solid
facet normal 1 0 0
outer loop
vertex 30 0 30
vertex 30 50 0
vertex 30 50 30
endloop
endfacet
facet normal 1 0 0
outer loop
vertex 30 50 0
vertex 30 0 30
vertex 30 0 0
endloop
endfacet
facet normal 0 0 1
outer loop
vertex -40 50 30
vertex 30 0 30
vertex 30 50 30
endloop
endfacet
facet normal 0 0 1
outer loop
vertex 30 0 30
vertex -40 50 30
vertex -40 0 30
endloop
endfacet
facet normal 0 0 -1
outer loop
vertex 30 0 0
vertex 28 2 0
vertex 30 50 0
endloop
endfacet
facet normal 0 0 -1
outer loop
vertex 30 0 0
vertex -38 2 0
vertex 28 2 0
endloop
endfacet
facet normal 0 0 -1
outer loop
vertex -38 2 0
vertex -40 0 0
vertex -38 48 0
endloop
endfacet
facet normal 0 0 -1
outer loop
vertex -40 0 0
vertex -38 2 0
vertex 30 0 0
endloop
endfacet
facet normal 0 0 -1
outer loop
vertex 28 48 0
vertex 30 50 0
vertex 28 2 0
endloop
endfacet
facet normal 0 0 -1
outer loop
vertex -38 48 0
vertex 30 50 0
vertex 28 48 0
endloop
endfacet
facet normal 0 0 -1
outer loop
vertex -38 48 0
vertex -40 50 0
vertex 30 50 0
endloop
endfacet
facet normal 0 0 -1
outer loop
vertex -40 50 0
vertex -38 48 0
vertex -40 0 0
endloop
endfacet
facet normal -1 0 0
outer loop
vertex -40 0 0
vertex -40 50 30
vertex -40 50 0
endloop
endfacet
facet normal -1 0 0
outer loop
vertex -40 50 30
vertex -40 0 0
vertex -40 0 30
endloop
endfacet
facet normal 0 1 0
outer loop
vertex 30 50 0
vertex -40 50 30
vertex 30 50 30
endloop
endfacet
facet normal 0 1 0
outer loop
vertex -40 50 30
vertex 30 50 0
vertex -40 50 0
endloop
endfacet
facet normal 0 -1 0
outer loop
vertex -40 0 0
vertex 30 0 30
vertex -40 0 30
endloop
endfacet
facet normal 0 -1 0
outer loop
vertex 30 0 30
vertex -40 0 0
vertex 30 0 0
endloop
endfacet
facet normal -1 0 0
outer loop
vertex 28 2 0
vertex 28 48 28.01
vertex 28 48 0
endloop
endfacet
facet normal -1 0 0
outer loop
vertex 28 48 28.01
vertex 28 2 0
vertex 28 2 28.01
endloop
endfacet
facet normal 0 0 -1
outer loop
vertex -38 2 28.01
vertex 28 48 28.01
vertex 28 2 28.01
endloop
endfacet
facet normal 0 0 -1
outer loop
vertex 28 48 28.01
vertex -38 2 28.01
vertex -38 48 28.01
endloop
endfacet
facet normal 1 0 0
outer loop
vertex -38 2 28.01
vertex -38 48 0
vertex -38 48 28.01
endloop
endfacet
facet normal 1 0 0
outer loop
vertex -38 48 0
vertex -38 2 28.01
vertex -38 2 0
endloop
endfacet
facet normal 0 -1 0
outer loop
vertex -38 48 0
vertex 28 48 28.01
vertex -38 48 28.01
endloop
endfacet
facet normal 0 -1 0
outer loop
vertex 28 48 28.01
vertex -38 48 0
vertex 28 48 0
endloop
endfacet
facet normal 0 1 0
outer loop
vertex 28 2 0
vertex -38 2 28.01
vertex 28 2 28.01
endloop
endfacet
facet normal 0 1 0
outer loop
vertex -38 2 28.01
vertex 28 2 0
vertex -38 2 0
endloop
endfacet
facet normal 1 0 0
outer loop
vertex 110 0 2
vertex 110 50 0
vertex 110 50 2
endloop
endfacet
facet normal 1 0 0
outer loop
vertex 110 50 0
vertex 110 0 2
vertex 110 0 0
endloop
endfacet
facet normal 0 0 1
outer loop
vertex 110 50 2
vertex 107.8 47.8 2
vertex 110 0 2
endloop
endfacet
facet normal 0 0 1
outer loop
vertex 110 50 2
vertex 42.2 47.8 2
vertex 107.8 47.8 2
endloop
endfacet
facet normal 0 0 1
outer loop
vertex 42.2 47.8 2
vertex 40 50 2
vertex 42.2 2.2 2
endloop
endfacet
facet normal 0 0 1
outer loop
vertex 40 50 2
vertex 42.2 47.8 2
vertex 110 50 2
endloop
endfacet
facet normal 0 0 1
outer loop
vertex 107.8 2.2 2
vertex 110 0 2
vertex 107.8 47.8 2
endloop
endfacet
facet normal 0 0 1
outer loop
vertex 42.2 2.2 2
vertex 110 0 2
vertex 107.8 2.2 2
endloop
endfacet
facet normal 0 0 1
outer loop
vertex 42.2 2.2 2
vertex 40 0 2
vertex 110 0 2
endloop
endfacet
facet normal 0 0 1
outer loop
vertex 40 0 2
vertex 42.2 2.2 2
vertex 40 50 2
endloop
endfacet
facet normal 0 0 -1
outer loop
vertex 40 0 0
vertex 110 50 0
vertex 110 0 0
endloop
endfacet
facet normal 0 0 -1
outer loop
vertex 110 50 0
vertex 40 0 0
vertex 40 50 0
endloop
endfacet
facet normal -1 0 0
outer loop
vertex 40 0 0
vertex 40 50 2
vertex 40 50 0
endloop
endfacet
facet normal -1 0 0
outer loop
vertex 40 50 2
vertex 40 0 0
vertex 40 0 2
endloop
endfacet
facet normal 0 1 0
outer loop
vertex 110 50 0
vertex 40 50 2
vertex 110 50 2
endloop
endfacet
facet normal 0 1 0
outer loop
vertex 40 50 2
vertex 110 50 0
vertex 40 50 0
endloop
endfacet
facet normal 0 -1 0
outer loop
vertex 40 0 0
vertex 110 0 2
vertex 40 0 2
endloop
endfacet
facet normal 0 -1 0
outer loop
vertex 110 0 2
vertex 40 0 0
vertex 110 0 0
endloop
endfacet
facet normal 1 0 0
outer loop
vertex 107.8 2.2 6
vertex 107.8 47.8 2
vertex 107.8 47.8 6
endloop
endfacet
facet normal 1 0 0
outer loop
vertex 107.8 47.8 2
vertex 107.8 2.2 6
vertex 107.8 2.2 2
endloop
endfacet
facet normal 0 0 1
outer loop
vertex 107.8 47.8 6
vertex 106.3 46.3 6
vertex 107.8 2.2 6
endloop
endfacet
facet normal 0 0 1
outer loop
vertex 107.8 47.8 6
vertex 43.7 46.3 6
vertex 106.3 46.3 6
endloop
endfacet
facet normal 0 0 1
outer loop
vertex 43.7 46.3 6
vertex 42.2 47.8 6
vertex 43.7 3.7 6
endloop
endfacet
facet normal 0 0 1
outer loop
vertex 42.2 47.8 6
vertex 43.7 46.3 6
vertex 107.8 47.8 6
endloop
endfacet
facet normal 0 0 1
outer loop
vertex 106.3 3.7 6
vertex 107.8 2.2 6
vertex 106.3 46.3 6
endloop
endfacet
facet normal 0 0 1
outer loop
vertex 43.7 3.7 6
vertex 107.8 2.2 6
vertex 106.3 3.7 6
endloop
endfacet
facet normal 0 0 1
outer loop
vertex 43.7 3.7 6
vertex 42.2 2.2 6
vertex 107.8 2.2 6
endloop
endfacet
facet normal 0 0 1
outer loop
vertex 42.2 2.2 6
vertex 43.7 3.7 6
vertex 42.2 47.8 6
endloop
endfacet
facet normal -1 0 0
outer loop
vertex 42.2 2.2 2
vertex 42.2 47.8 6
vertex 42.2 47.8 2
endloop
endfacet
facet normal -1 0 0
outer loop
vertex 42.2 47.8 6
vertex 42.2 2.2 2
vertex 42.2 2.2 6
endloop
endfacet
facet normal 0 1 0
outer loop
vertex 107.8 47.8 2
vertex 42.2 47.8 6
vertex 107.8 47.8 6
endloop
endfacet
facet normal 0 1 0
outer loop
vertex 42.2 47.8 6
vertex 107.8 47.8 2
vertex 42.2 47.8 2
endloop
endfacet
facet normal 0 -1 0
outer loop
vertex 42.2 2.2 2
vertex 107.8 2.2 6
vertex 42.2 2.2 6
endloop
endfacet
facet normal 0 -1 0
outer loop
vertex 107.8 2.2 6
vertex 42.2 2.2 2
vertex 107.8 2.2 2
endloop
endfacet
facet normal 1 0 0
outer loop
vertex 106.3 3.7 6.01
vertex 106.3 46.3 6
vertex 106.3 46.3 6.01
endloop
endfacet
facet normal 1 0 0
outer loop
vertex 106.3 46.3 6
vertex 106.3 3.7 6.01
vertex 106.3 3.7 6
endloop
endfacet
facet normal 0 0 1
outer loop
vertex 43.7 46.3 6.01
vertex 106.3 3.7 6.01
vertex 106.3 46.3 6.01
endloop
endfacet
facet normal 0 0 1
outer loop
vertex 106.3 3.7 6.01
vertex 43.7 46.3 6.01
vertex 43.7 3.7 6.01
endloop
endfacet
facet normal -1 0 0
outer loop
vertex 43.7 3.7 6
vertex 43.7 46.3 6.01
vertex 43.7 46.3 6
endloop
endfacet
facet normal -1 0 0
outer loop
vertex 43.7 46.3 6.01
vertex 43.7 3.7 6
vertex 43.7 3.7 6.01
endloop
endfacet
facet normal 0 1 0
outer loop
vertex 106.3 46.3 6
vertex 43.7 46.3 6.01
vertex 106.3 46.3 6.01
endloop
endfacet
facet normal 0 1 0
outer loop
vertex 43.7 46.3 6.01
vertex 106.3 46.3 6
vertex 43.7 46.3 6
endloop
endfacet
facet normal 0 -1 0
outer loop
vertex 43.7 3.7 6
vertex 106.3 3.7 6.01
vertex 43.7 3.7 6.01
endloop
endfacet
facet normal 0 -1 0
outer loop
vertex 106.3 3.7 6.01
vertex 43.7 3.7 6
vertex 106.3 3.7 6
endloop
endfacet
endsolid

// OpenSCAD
// Dimensions for the box and lid
box_outer_x = 70;
box_outer_y = 50;
box_outer_z = 30;
wall_thickness = 2;
floor_thickness = 2;

lid_plate_x = 70;
lid_plate_y = 50;
lid_plate_z = 2;
lip_thickness = 1.5;
lip_height = 4;
lip_outer_x = 65.6;
lip_outer_y = 45.6;

// Clearance and gap settings
gap_between_parts = 10;
$fn = 64;

// Calculate derived dimensions
box_inner_x = box_outer_x - 2 * wall_thickness;
box_inner_y = box_outer_y - 2 * wall_thickness;
box_inner_z = box_outer_z - floor_thickness;

// Position offsets to center parts and maintain gap
// Box is on the left (-X), Lid is on the right (+X)
// Box center X: - (box_outer_x/2 + gap/2)
// Lid center X: + (lid_plate_x/2 + gap/2)
box_offset_x = -(box_outer_x / 2 + gap_between_parts / 2);
lid_offset_x = (lid_plate_x / 2 + gap_between_parts / 2);

// Part 1: The Box
translate([box_offset_x, 0, 0])
difference()
{
    // Outer shell of the box
    cube([box_outer_x, box_outer_y, box_outer_z], center = false);
    
    // Inner cavity (open top)
    // Extend slightly past the top to ensure clean cut
    translate([wall_thickness, wall_thickness, -0.01])
    cube([box_inner_x, box_inner_y, box_inner_z + 0.02], center = false);
}

// Part 2: The Lid (printed upside down, so plate is on bed)
translate([lid_offset_x, 0, 0])
union()
{
    // Main plate lying on the bed
    cube([lid_plate_x, lid_plate_y, lid_plate_z], center = false);
    
    // Lip structure
    // The lip is centered on the plate
    lip_offset_x = (lid_plate_x - lip_outer_x) / 2;
    lip_offset_y = (lid_plate_y - lip_outer_y) / 2;
    
    // Outer wall of the lip
    translate([lip_offset_x, lip_offset_y, lid_plate_z])
    cube([lip_outer_x, lip_outer_y, lip_height], center = false);
    
    // Inner cutout of the lip to make it a wall
    // Extend slightly past the bottom and top to ensure clean cut
    translate([lip_offset_x + lip_thickness, lip_offset_y + lip_thickness, lid_plate_z - 0.01])
    cube([lip_outer_x - 2 * lip_thickness, lip_outer_y - 2 * lip_thickness, lip_height + 0.02], center = false);
}
